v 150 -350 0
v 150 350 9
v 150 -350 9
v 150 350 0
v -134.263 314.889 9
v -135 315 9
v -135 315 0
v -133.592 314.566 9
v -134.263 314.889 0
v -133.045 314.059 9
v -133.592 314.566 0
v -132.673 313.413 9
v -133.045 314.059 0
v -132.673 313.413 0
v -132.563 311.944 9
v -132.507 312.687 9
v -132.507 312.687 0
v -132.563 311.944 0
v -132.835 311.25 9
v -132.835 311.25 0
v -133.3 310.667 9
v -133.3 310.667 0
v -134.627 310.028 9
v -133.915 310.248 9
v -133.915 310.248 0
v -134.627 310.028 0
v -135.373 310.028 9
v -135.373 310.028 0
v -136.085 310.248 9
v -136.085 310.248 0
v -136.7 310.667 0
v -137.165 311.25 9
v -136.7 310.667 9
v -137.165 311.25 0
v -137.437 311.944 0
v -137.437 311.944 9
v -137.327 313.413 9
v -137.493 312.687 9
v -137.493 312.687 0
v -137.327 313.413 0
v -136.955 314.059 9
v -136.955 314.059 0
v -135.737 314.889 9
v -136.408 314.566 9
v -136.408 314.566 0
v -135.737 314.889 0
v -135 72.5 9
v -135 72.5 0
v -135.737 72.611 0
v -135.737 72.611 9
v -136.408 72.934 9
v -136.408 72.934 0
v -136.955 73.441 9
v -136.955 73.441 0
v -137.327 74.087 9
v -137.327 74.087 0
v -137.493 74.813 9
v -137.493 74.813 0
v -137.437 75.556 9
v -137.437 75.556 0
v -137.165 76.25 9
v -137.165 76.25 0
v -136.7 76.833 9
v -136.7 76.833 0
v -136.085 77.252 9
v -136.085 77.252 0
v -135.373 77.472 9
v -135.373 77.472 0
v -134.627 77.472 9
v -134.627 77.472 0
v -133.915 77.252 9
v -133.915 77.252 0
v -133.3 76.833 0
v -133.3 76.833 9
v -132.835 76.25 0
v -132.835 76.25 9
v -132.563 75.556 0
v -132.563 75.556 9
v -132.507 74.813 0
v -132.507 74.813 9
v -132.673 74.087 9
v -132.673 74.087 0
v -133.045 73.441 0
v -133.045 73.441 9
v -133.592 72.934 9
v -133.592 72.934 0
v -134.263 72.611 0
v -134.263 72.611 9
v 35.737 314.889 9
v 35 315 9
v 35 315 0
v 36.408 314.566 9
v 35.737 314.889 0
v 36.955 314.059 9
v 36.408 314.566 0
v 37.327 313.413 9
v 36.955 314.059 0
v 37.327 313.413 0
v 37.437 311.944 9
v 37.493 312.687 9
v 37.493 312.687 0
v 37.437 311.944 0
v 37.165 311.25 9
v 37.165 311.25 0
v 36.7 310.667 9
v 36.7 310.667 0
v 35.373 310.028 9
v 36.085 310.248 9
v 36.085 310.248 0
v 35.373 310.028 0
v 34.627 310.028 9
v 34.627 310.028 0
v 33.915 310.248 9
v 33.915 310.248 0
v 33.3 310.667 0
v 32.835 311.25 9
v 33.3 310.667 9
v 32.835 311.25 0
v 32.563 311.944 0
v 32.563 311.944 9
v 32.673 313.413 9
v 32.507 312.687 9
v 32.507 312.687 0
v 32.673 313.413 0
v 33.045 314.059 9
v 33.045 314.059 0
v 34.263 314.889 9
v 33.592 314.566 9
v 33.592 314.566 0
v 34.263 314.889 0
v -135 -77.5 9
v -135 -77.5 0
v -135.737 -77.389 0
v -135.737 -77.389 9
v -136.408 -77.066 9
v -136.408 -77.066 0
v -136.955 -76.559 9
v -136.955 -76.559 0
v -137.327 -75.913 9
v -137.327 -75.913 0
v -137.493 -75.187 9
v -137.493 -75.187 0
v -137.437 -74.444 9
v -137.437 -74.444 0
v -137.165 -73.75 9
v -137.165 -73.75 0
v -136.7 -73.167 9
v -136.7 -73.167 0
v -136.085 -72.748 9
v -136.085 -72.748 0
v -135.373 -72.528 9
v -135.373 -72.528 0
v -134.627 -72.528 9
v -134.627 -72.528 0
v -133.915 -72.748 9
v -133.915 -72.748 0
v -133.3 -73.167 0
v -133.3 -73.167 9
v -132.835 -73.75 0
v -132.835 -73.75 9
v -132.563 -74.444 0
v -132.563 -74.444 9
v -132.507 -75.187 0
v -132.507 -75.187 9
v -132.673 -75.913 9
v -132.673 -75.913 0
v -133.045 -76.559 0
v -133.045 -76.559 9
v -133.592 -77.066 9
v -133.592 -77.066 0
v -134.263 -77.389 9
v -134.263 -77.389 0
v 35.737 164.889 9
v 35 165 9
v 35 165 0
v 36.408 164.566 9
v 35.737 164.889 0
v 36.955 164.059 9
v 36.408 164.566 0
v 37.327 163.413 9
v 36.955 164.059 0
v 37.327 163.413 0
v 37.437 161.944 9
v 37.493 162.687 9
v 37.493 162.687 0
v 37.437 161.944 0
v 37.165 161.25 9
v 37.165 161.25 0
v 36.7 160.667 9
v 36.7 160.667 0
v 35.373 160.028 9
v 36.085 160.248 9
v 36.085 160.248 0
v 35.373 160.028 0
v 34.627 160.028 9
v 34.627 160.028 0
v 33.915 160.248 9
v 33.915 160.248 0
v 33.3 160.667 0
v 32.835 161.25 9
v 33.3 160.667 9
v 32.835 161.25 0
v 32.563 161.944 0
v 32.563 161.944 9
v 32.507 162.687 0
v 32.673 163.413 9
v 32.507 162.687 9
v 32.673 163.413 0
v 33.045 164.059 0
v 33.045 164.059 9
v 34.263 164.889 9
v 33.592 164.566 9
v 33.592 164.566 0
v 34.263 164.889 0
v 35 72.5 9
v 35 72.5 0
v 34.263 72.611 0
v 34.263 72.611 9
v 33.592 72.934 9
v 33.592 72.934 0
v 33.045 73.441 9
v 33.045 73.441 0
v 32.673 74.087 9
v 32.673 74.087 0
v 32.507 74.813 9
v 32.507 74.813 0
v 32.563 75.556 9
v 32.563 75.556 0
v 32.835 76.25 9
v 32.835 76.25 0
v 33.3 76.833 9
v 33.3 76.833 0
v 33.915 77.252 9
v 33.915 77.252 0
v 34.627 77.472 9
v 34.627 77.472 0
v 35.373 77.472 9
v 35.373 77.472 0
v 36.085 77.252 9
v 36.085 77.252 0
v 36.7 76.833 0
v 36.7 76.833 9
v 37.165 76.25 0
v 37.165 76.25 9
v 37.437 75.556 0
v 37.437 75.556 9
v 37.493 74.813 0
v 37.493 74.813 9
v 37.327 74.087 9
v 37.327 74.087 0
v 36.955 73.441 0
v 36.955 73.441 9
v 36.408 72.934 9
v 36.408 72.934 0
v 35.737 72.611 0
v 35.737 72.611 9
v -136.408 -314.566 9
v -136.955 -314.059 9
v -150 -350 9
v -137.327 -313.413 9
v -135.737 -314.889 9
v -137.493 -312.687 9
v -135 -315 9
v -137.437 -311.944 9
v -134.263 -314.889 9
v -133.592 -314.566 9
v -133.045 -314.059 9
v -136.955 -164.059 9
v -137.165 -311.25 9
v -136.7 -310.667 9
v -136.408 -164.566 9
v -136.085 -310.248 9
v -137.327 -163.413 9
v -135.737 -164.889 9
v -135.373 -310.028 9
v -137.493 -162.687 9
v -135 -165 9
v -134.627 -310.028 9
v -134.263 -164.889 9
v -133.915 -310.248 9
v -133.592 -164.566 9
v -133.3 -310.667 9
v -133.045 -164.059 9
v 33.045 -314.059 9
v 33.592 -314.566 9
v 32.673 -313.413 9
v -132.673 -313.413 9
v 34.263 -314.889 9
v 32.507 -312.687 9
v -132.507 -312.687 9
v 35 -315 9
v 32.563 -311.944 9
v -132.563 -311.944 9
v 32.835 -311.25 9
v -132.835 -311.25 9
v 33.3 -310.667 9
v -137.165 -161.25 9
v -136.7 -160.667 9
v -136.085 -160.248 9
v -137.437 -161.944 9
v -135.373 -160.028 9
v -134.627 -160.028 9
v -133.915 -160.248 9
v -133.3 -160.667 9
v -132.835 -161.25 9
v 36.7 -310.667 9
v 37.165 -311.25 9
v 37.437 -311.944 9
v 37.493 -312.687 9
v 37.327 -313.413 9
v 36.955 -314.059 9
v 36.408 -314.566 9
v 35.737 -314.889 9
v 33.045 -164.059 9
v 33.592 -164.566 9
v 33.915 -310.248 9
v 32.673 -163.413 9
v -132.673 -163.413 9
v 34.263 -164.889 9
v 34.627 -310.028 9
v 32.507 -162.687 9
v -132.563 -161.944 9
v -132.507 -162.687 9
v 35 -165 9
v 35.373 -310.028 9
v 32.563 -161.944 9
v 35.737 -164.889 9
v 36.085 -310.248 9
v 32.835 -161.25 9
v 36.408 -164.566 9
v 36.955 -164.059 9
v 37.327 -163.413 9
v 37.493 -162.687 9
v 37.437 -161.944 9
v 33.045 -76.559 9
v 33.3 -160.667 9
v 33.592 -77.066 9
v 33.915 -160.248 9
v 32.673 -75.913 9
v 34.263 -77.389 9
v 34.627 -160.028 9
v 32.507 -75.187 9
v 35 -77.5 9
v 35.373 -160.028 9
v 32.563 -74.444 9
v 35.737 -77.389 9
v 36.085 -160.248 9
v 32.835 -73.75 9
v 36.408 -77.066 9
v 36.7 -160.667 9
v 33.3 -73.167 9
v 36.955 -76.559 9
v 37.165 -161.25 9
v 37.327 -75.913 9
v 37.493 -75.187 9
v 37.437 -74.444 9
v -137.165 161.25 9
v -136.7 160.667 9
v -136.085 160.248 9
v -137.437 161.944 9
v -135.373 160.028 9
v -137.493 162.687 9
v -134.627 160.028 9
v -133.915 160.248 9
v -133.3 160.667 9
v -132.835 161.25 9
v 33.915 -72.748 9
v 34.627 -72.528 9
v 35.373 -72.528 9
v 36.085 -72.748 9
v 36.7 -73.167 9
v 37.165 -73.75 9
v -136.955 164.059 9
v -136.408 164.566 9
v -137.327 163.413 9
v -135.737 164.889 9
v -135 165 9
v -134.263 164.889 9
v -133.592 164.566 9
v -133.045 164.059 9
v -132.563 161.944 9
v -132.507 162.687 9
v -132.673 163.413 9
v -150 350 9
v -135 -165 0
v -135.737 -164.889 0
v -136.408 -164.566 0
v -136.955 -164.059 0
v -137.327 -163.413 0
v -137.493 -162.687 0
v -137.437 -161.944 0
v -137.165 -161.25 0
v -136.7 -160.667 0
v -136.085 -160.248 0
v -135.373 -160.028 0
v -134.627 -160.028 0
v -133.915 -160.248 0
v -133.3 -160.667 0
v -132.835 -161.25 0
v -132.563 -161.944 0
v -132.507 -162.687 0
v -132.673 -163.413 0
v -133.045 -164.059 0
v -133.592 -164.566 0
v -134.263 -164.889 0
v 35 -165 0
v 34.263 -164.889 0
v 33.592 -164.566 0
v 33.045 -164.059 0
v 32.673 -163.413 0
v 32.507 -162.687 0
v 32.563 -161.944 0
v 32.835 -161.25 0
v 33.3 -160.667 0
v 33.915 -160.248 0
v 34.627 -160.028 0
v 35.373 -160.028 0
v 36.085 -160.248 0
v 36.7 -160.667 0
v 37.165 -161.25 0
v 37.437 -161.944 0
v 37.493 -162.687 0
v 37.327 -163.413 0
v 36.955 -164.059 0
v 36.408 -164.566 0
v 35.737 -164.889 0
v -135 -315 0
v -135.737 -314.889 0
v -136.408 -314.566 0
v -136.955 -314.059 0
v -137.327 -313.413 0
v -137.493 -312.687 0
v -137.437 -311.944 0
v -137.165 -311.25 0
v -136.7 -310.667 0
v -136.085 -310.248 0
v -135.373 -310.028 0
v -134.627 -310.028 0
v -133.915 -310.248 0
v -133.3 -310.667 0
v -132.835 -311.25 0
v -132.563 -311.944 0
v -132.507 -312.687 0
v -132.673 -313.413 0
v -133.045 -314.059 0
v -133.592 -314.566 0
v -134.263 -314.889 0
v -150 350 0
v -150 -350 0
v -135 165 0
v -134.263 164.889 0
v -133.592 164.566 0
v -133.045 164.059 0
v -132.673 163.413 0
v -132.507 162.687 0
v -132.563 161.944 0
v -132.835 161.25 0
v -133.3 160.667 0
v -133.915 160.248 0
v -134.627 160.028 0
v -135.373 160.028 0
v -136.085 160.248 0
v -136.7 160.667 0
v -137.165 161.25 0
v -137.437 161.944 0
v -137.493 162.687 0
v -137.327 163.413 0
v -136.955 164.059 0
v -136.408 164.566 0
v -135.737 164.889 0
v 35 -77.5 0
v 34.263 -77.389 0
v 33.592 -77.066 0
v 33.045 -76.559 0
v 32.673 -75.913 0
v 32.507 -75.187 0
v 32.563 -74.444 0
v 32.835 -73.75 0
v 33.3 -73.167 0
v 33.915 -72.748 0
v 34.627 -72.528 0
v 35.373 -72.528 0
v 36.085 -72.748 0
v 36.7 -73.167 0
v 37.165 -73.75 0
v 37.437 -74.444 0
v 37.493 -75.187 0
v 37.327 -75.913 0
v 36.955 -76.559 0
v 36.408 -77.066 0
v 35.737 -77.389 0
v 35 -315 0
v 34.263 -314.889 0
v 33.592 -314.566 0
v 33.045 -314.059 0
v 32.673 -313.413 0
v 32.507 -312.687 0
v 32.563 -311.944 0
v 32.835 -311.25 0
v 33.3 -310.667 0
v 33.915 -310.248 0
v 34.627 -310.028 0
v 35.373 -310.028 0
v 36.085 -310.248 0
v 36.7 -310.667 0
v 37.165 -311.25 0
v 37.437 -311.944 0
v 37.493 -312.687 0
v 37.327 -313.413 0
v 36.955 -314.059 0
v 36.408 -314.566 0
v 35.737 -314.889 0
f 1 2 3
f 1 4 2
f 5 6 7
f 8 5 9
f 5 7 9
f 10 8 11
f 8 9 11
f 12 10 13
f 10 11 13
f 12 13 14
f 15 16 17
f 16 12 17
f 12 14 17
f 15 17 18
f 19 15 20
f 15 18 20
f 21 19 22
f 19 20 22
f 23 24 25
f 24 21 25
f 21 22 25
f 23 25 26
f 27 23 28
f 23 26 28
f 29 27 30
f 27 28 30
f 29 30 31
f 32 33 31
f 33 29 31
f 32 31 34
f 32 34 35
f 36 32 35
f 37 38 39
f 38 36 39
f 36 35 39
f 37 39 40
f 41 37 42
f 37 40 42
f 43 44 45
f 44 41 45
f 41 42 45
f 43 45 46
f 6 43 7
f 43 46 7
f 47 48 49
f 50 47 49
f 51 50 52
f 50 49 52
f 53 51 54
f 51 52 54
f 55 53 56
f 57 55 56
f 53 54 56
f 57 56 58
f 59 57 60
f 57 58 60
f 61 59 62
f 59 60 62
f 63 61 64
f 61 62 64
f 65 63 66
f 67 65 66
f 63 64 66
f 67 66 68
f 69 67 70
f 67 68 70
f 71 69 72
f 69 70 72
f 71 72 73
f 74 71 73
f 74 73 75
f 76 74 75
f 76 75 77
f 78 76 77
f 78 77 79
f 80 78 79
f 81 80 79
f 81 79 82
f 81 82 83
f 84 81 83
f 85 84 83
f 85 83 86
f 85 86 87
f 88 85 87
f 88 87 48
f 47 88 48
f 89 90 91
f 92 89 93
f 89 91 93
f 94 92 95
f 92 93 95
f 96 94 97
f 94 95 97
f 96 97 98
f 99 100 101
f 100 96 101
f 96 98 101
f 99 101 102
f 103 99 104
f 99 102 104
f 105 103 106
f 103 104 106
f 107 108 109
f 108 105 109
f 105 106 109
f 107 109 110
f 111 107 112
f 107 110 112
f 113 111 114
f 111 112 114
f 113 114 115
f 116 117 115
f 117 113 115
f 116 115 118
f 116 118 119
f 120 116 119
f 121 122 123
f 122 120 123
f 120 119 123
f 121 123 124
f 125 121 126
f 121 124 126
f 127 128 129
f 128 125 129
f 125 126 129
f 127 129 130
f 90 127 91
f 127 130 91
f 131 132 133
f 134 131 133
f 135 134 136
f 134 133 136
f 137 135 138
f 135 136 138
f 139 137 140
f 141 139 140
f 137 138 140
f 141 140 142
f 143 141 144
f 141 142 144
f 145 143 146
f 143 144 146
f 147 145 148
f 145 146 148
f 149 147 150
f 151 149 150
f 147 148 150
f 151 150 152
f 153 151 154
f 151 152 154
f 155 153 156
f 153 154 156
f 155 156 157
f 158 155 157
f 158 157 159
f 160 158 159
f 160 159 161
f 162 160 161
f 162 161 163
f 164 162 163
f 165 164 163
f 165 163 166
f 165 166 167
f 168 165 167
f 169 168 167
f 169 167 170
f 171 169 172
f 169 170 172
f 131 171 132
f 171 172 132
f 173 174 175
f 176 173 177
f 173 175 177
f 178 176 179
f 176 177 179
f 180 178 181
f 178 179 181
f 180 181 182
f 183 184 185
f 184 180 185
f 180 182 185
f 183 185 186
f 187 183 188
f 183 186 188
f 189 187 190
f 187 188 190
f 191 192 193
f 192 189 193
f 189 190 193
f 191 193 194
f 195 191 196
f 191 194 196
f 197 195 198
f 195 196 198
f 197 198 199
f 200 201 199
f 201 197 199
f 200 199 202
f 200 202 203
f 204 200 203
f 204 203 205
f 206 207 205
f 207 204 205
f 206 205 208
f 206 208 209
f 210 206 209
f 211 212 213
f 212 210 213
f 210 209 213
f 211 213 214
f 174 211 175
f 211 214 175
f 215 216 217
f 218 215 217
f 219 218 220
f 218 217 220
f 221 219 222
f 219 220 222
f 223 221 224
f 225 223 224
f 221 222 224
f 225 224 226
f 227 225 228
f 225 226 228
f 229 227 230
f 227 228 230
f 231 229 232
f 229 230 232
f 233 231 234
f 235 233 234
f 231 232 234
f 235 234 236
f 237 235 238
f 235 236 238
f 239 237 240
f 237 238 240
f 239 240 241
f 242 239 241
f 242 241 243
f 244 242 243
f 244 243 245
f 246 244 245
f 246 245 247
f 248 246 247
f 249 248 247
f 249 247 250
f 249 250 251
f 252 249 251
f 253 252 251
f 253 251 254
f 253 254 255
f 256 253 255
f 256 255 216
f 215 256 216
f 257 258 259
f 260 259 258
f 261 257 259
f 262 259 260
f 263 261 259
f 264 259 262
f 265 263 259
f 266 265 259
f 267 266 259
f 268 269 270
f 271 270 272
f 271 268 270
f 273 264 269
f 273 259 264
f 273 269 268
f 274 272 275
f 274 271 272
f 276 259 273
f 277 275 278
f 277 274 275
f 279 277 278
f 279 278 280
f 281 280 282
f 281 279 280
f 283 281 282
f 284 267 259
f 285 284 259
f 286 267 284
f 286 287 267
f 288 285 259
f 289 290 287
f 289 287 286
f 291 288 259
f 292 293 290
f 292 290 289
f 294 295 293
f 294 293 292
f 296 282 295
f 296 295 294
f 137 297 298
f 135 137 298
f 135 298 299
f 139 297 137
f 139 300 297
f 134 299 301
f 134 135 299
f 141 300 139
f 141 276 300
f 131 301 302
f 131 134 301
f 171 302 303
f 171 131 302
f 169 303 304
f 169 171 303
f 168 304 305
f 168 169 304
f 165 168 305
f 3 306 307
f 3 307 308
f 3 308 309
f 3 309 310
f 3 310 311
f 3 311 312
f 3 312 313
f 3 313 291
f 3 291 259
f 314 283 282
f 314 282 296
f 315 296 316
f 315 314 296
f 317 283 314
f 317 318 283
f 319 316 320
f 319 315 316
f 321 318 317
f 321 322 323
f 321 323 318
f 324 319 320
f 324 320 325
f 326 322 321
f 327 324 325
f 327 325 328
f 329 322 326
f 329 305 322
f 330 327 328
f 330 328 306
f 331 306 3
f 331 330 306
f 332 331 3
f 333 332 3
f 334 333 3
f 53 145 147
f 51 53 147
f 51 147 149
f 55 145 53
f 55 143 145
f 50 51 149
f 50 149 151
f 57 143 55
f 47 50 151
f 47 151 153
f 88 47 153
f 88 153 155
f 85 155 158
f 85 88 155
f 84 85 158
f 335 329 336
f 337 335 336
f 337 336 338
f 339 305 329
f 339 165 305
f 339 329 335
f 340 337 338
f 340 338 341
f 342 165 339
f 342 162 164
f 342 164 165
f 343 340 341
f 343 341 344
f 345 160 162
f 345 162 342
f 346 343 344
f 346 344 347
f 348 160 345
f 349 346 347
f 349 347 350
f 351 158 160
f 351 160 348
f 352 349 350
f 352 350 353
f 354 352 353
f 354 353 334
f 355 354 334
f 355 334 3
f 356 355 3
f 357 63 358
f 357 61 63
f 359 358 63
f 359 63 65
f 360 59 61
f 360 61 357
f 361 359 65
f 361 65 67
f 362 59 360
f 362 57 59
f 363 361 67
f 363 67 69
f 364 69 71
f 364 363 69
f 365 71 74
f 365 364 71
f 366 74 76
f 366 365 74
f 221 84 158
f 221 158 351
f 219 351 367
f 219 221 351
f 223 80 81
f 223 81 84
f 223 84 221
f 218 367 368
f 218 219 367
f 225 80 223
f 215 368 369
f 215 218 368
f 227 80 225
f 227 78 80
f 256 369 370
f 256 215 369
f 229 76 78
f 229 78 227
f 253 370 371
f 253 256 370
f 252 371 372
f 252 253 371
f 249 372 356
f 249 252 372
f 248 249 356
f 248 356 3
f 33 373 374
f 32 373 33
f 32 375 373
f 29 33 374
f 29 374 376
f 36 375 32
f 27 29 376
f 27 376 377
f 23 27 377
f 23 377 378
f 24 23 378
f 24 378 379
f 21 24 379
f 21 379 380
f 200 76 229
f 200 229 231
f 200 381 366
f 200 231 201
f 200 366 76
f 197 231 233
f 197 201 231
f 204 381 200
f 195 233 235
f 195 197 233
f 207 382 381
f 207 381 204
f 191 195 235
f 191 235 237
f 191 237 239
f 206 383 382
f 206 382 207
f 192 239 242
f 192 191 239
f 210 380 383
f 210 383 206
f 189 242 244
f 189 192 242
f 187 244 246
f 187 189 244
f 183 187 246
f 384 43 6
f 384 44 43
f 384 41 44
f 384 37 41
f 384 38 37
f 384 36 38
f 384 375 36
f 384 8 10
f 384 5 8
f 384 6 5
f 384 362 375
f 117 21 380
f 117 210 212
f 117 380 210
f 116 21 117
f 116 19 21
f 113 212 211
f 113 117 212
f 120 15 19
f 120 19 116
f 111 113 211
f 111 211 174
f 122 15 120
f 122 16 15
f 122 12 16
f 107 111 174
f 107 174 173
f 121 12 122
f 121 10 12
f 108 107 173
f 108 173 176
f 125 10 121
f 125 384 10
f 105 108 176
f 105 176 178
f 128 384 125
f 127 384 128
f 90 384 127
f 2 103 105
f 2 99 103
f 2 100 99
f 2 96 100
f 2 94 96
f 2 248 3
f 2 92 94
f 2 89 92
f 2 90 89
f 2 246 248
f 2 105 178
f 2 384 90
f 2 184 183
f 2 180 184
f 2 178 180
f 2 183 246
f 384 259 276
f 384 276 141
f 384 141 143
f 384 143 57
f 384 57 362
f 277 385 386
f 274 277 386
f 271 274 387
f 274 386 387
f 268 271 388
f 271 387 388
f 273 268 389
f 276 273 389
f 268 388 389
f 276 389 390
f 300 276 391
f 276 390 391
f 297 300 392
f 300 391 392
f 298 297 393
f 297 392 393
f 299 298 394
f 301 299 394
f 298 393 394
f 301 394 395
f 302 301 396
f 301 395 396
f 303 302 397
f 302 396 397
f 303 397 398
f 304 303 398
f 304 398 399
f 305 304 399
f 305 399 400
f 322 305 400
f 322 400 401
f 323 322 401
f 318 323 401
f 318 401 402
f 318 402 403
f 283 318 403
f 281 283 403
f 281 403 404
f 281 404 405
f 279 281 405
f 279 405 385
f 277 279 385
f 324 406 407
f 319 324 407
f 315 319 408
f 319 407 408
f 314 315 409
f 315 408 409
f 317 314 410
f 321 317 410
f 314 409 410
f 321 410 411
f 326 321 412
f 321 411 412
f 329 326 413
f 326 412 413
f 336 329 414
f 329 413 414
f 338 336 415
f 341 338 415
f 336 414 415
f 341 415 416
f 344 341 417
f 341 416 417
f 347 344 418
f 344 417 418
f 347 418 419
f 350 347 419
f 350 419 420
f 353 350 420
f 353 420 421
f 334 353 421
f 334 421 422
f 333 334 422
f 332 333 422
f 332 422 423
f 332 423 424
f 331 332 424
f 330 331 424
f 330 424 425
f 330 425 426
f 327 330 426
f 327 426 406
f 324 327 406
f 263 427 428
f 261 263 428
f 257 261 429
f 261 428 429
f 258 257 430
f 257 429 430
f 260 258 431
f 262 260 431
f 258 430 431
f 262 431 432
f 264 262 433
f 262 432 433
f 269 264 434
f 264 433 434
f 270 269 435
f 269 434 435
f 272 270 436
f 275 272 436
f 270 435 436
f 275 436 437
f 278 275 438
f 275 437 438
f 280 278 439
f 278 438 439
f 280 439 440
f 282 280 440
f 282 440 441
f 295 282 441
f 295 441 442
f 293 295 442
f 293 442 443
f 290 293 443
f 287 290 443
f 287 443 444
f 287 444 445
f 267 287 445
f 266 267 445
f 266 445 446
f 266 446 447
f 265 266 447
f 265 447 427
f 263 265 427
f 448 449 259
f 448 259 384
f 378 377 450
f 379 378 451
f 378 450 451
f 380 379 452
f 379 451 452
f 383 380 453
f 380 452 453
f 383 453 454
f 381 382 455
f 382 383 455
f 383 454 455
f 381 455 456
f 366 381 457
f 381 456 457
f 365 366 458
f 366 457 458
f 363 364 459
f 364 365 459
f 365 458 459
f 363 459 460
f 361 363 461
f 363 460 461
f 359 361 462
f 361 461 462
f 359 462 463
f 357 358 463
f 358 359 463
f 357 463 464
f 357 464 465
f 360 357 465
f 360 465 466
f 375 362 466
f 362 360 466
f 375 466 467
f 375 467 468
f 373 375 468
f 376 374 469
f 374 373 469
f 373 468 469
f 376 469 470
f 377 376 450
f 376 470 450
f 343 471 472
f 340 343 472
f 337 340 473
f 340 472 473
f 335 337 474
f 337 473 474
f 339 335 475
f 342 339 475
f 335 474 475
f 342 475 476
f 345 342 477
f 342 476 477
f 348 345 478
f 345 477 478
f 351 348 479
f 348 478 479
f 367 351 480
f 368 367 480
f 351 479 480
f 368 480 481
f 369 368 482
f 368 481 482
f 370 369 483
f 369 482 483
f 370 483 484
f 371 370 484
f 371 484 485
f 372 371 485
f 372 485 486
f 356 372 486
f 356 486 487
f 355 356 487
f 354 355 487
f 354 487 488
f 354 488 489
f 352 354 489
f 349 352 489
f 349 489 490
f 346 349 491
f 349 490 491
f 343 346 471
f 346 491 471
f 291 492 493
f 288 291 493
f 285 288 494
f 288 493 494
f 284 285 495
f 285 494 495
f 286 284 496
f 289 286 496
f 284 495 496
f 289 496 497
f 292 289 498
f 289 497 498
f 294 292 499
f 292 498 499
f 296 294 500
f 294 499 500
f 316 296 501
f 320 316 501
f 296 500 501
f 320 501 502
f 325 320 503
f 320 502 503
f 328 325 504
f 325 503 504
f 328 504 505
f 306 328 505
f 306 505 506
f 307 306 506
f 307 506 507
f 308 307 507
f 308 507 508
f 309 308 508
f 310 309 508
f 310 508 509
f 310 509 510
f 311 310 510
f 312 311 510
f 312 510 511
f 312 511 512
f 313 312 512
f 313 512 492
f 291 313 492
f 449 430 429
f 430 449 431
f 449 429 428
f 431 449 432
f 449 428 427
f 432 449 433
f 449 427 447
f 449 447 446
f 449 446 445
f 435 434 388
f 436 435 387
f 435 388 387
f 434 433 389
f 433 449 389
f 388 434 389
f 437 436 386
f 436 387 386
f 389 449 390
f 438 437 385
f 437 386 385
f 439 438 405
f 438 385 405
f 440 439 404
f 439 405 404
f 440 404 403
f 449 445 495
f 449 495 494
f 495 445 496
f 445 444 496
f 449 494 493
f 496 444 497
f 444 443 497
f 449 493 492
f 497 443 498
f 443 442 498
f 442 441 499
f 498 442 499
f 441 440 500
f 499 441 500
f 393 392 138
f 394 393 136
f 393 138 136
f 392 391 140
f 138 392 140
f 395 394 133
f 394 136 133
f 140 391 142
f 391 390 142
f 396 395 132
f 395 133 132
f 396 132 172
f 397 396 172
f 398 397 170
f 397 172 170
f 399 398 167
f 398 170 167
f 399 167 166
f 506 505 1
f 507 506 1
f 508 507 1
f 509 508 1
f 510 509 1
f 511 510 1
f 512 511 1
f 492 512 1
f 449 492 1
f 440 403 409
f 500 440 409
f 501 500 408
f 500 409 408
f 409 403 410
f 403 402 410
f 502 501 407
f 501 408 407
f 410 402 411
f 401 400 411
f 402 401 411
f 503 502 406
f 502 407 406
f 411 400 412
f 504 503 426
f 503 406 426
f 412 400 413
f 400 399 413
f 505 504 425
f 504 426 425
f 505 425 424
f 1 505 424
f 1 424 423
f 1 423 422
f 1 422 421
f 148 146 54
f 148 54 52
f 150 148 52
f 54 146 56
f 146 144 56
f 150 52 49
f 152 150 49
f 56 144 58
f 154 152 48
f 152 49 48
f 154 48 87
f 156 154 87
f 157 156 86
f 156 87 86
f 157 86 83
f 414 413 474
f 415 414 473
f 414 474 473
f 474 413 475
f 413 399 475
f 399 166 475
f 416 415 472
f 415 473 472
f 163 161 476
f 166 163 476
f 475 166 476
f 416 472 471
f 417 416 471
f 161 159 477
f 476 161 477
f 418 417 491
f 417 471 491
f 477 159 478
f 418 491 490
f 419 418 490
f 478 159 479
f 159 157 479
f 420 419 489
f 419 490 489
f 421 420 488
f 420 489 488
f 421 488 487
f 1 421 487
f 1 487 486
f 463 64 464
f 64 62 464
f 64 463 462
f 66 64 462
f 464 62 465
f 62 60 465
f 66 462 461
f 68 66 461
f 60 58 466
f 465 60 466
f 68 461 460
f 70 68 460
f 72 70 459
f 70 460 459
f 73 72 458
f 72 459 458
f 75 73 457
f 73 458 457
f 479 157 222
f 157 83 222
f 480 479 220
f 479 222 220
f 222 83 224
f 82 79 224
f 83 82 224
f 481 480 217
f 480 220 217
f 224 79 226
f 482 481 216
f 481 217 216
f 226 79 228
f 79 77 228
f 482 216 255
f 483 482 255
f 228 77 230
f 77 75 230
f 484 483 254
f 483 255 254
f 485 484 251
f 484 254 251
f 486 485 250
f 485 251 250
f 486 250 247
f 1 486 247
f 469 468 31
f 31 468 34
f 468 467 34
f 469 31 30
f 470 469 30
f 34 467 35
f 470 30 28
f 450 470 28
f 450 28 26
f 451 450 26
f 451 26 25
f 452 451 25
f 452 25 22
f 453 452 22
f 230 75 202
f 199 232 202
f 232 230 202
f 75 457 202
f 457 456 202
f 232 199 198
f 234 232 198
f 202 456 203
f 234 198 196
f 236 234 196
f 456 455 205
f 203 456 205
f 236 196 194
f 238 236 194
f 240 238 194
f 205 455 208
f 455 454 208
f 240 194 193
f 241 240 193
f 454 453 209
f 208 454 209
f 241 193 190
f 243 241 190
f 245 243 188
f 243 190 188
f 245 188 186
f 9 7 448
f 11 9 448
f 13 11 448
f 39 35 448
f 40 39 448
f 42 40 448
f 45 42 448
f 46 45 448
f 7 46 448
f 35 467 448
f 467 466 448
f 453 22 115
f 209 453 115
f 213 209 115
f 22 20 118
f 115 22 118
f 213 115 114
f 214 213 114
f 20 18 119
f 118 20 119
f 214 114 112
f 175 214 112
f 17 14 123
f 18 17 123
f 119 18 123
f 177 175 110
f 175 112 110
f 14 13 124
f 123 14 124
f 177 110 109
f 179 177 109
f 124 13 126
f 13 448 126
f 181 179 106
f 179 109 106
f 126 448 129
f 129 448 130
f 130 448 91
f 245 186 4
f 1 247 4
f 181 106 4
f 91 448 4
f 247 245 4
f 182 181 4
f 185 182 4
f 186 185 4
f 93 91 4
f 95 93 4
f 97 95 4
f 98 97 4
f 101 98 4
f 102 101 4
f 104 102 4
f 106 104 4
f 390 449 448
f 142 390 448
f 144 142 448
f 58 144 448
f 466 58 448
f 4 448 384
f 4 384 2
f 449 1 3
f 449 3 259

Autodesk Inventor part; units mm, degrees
ref_plane "YZ Plane" through (0, 0, 0) normal (1, 0, 0) x (0, 1, 0)
ref_plane "XZ Plane" through (0, 0, 0) normal (0, 1, 0) x (-1, 0, 0)
ref_plane "XY Plane" through (0, 0, 0) normal (0, 0, 1) x (1, 0, 0)
sketch "Sketch1" plane through (0, 0, 0) normal (0, 0, 1) x (1, 0, 0)
  line L0 (150, -350) -> (-150, -350)
  line L1 (-150, -350) -> (-150, 350)
  line L2 (-150, 350) -> (150, 350)
  line L3 (150, 350) -> (150, -350)
  line L4 (150, -350) -> (-150, 350) construction
  line L5 (-150, -350) -> (150, 350) construction
  point P0 (0, 0)
  dimension "d0" = 700
  dimension "d1" = 300
extrude "Extrusion1" add sketch "Sketch1" along normal blind 9
sketch "Sketch2" plane through (0, 0, 9) normal (0, 0, 1) x (1, 0, 0)
  line L0 (-135, -162.5) -> (35, -162.5) construction
  line L1 (35, -162.5) -> (35, -312.5) construction
  line L2 (35, -312.5) -> (-135, -312.5) construction
  line L3 (-135, -312.5) -> (-135, -162.5) construction
  point P0 (0, 0)
  point P1 (-150, -350)
  dimension "d4" = 170
  dimension "d5" = 150
  dimension "d16" = 37.5
  dimension "d17" = 15
hole "Hole1" at (35, -162.5, 9) at (35, -312.5, 9) at (-135, -162.5, 9) at (-135, -312.5, 9) direction (0, 0, -1) diameter 5 end through all
mirror "Mirror1" about plane through (0, 0, 0) normal (0, 1, 0) of "Hole1"
sketch "Sketch4" plane through (0, 0, 9) normal (0, 0, 1) x (1, 0, 0)
  line L0 (-135, 75) -> (35, 75) construction
  line L1 (35, 75) -> (35, -75) construction
  line L2 (35, -75) -> (-135, -75) construction
  line L3 (-135, -75) -> (-135, 75) construction
  circle A0 centre (35, 162.5) radius 2.5 construction
  circle A1 centre (-135, 162.5) radius 2.5 construction
  circle A2 centre (35, 312.5) radius 2.5 construction
  circle A3 centre (35, -162.5) radius 2.5 construction
  point P0 (0, 0)
  dimension "d18" = 150
  dimension "d19" = 170
  dimension "d20" = 170
  dimension "d21" = 150
  dimension "d22" = 87.5
  dimension "d23" = 87.5
  dimension "d24" = 0
hole "Hole2" at (35, 75, 9) at (35, -75, 9) at (-135, -75, 9) at (-135, 75, 9) direction (0, 0, -1) diameter 5 end through all
equation "\"d18\" = d21"
equation "\"d19\" = d20"
properties part number "GBX_002.1-bottom-plate"
